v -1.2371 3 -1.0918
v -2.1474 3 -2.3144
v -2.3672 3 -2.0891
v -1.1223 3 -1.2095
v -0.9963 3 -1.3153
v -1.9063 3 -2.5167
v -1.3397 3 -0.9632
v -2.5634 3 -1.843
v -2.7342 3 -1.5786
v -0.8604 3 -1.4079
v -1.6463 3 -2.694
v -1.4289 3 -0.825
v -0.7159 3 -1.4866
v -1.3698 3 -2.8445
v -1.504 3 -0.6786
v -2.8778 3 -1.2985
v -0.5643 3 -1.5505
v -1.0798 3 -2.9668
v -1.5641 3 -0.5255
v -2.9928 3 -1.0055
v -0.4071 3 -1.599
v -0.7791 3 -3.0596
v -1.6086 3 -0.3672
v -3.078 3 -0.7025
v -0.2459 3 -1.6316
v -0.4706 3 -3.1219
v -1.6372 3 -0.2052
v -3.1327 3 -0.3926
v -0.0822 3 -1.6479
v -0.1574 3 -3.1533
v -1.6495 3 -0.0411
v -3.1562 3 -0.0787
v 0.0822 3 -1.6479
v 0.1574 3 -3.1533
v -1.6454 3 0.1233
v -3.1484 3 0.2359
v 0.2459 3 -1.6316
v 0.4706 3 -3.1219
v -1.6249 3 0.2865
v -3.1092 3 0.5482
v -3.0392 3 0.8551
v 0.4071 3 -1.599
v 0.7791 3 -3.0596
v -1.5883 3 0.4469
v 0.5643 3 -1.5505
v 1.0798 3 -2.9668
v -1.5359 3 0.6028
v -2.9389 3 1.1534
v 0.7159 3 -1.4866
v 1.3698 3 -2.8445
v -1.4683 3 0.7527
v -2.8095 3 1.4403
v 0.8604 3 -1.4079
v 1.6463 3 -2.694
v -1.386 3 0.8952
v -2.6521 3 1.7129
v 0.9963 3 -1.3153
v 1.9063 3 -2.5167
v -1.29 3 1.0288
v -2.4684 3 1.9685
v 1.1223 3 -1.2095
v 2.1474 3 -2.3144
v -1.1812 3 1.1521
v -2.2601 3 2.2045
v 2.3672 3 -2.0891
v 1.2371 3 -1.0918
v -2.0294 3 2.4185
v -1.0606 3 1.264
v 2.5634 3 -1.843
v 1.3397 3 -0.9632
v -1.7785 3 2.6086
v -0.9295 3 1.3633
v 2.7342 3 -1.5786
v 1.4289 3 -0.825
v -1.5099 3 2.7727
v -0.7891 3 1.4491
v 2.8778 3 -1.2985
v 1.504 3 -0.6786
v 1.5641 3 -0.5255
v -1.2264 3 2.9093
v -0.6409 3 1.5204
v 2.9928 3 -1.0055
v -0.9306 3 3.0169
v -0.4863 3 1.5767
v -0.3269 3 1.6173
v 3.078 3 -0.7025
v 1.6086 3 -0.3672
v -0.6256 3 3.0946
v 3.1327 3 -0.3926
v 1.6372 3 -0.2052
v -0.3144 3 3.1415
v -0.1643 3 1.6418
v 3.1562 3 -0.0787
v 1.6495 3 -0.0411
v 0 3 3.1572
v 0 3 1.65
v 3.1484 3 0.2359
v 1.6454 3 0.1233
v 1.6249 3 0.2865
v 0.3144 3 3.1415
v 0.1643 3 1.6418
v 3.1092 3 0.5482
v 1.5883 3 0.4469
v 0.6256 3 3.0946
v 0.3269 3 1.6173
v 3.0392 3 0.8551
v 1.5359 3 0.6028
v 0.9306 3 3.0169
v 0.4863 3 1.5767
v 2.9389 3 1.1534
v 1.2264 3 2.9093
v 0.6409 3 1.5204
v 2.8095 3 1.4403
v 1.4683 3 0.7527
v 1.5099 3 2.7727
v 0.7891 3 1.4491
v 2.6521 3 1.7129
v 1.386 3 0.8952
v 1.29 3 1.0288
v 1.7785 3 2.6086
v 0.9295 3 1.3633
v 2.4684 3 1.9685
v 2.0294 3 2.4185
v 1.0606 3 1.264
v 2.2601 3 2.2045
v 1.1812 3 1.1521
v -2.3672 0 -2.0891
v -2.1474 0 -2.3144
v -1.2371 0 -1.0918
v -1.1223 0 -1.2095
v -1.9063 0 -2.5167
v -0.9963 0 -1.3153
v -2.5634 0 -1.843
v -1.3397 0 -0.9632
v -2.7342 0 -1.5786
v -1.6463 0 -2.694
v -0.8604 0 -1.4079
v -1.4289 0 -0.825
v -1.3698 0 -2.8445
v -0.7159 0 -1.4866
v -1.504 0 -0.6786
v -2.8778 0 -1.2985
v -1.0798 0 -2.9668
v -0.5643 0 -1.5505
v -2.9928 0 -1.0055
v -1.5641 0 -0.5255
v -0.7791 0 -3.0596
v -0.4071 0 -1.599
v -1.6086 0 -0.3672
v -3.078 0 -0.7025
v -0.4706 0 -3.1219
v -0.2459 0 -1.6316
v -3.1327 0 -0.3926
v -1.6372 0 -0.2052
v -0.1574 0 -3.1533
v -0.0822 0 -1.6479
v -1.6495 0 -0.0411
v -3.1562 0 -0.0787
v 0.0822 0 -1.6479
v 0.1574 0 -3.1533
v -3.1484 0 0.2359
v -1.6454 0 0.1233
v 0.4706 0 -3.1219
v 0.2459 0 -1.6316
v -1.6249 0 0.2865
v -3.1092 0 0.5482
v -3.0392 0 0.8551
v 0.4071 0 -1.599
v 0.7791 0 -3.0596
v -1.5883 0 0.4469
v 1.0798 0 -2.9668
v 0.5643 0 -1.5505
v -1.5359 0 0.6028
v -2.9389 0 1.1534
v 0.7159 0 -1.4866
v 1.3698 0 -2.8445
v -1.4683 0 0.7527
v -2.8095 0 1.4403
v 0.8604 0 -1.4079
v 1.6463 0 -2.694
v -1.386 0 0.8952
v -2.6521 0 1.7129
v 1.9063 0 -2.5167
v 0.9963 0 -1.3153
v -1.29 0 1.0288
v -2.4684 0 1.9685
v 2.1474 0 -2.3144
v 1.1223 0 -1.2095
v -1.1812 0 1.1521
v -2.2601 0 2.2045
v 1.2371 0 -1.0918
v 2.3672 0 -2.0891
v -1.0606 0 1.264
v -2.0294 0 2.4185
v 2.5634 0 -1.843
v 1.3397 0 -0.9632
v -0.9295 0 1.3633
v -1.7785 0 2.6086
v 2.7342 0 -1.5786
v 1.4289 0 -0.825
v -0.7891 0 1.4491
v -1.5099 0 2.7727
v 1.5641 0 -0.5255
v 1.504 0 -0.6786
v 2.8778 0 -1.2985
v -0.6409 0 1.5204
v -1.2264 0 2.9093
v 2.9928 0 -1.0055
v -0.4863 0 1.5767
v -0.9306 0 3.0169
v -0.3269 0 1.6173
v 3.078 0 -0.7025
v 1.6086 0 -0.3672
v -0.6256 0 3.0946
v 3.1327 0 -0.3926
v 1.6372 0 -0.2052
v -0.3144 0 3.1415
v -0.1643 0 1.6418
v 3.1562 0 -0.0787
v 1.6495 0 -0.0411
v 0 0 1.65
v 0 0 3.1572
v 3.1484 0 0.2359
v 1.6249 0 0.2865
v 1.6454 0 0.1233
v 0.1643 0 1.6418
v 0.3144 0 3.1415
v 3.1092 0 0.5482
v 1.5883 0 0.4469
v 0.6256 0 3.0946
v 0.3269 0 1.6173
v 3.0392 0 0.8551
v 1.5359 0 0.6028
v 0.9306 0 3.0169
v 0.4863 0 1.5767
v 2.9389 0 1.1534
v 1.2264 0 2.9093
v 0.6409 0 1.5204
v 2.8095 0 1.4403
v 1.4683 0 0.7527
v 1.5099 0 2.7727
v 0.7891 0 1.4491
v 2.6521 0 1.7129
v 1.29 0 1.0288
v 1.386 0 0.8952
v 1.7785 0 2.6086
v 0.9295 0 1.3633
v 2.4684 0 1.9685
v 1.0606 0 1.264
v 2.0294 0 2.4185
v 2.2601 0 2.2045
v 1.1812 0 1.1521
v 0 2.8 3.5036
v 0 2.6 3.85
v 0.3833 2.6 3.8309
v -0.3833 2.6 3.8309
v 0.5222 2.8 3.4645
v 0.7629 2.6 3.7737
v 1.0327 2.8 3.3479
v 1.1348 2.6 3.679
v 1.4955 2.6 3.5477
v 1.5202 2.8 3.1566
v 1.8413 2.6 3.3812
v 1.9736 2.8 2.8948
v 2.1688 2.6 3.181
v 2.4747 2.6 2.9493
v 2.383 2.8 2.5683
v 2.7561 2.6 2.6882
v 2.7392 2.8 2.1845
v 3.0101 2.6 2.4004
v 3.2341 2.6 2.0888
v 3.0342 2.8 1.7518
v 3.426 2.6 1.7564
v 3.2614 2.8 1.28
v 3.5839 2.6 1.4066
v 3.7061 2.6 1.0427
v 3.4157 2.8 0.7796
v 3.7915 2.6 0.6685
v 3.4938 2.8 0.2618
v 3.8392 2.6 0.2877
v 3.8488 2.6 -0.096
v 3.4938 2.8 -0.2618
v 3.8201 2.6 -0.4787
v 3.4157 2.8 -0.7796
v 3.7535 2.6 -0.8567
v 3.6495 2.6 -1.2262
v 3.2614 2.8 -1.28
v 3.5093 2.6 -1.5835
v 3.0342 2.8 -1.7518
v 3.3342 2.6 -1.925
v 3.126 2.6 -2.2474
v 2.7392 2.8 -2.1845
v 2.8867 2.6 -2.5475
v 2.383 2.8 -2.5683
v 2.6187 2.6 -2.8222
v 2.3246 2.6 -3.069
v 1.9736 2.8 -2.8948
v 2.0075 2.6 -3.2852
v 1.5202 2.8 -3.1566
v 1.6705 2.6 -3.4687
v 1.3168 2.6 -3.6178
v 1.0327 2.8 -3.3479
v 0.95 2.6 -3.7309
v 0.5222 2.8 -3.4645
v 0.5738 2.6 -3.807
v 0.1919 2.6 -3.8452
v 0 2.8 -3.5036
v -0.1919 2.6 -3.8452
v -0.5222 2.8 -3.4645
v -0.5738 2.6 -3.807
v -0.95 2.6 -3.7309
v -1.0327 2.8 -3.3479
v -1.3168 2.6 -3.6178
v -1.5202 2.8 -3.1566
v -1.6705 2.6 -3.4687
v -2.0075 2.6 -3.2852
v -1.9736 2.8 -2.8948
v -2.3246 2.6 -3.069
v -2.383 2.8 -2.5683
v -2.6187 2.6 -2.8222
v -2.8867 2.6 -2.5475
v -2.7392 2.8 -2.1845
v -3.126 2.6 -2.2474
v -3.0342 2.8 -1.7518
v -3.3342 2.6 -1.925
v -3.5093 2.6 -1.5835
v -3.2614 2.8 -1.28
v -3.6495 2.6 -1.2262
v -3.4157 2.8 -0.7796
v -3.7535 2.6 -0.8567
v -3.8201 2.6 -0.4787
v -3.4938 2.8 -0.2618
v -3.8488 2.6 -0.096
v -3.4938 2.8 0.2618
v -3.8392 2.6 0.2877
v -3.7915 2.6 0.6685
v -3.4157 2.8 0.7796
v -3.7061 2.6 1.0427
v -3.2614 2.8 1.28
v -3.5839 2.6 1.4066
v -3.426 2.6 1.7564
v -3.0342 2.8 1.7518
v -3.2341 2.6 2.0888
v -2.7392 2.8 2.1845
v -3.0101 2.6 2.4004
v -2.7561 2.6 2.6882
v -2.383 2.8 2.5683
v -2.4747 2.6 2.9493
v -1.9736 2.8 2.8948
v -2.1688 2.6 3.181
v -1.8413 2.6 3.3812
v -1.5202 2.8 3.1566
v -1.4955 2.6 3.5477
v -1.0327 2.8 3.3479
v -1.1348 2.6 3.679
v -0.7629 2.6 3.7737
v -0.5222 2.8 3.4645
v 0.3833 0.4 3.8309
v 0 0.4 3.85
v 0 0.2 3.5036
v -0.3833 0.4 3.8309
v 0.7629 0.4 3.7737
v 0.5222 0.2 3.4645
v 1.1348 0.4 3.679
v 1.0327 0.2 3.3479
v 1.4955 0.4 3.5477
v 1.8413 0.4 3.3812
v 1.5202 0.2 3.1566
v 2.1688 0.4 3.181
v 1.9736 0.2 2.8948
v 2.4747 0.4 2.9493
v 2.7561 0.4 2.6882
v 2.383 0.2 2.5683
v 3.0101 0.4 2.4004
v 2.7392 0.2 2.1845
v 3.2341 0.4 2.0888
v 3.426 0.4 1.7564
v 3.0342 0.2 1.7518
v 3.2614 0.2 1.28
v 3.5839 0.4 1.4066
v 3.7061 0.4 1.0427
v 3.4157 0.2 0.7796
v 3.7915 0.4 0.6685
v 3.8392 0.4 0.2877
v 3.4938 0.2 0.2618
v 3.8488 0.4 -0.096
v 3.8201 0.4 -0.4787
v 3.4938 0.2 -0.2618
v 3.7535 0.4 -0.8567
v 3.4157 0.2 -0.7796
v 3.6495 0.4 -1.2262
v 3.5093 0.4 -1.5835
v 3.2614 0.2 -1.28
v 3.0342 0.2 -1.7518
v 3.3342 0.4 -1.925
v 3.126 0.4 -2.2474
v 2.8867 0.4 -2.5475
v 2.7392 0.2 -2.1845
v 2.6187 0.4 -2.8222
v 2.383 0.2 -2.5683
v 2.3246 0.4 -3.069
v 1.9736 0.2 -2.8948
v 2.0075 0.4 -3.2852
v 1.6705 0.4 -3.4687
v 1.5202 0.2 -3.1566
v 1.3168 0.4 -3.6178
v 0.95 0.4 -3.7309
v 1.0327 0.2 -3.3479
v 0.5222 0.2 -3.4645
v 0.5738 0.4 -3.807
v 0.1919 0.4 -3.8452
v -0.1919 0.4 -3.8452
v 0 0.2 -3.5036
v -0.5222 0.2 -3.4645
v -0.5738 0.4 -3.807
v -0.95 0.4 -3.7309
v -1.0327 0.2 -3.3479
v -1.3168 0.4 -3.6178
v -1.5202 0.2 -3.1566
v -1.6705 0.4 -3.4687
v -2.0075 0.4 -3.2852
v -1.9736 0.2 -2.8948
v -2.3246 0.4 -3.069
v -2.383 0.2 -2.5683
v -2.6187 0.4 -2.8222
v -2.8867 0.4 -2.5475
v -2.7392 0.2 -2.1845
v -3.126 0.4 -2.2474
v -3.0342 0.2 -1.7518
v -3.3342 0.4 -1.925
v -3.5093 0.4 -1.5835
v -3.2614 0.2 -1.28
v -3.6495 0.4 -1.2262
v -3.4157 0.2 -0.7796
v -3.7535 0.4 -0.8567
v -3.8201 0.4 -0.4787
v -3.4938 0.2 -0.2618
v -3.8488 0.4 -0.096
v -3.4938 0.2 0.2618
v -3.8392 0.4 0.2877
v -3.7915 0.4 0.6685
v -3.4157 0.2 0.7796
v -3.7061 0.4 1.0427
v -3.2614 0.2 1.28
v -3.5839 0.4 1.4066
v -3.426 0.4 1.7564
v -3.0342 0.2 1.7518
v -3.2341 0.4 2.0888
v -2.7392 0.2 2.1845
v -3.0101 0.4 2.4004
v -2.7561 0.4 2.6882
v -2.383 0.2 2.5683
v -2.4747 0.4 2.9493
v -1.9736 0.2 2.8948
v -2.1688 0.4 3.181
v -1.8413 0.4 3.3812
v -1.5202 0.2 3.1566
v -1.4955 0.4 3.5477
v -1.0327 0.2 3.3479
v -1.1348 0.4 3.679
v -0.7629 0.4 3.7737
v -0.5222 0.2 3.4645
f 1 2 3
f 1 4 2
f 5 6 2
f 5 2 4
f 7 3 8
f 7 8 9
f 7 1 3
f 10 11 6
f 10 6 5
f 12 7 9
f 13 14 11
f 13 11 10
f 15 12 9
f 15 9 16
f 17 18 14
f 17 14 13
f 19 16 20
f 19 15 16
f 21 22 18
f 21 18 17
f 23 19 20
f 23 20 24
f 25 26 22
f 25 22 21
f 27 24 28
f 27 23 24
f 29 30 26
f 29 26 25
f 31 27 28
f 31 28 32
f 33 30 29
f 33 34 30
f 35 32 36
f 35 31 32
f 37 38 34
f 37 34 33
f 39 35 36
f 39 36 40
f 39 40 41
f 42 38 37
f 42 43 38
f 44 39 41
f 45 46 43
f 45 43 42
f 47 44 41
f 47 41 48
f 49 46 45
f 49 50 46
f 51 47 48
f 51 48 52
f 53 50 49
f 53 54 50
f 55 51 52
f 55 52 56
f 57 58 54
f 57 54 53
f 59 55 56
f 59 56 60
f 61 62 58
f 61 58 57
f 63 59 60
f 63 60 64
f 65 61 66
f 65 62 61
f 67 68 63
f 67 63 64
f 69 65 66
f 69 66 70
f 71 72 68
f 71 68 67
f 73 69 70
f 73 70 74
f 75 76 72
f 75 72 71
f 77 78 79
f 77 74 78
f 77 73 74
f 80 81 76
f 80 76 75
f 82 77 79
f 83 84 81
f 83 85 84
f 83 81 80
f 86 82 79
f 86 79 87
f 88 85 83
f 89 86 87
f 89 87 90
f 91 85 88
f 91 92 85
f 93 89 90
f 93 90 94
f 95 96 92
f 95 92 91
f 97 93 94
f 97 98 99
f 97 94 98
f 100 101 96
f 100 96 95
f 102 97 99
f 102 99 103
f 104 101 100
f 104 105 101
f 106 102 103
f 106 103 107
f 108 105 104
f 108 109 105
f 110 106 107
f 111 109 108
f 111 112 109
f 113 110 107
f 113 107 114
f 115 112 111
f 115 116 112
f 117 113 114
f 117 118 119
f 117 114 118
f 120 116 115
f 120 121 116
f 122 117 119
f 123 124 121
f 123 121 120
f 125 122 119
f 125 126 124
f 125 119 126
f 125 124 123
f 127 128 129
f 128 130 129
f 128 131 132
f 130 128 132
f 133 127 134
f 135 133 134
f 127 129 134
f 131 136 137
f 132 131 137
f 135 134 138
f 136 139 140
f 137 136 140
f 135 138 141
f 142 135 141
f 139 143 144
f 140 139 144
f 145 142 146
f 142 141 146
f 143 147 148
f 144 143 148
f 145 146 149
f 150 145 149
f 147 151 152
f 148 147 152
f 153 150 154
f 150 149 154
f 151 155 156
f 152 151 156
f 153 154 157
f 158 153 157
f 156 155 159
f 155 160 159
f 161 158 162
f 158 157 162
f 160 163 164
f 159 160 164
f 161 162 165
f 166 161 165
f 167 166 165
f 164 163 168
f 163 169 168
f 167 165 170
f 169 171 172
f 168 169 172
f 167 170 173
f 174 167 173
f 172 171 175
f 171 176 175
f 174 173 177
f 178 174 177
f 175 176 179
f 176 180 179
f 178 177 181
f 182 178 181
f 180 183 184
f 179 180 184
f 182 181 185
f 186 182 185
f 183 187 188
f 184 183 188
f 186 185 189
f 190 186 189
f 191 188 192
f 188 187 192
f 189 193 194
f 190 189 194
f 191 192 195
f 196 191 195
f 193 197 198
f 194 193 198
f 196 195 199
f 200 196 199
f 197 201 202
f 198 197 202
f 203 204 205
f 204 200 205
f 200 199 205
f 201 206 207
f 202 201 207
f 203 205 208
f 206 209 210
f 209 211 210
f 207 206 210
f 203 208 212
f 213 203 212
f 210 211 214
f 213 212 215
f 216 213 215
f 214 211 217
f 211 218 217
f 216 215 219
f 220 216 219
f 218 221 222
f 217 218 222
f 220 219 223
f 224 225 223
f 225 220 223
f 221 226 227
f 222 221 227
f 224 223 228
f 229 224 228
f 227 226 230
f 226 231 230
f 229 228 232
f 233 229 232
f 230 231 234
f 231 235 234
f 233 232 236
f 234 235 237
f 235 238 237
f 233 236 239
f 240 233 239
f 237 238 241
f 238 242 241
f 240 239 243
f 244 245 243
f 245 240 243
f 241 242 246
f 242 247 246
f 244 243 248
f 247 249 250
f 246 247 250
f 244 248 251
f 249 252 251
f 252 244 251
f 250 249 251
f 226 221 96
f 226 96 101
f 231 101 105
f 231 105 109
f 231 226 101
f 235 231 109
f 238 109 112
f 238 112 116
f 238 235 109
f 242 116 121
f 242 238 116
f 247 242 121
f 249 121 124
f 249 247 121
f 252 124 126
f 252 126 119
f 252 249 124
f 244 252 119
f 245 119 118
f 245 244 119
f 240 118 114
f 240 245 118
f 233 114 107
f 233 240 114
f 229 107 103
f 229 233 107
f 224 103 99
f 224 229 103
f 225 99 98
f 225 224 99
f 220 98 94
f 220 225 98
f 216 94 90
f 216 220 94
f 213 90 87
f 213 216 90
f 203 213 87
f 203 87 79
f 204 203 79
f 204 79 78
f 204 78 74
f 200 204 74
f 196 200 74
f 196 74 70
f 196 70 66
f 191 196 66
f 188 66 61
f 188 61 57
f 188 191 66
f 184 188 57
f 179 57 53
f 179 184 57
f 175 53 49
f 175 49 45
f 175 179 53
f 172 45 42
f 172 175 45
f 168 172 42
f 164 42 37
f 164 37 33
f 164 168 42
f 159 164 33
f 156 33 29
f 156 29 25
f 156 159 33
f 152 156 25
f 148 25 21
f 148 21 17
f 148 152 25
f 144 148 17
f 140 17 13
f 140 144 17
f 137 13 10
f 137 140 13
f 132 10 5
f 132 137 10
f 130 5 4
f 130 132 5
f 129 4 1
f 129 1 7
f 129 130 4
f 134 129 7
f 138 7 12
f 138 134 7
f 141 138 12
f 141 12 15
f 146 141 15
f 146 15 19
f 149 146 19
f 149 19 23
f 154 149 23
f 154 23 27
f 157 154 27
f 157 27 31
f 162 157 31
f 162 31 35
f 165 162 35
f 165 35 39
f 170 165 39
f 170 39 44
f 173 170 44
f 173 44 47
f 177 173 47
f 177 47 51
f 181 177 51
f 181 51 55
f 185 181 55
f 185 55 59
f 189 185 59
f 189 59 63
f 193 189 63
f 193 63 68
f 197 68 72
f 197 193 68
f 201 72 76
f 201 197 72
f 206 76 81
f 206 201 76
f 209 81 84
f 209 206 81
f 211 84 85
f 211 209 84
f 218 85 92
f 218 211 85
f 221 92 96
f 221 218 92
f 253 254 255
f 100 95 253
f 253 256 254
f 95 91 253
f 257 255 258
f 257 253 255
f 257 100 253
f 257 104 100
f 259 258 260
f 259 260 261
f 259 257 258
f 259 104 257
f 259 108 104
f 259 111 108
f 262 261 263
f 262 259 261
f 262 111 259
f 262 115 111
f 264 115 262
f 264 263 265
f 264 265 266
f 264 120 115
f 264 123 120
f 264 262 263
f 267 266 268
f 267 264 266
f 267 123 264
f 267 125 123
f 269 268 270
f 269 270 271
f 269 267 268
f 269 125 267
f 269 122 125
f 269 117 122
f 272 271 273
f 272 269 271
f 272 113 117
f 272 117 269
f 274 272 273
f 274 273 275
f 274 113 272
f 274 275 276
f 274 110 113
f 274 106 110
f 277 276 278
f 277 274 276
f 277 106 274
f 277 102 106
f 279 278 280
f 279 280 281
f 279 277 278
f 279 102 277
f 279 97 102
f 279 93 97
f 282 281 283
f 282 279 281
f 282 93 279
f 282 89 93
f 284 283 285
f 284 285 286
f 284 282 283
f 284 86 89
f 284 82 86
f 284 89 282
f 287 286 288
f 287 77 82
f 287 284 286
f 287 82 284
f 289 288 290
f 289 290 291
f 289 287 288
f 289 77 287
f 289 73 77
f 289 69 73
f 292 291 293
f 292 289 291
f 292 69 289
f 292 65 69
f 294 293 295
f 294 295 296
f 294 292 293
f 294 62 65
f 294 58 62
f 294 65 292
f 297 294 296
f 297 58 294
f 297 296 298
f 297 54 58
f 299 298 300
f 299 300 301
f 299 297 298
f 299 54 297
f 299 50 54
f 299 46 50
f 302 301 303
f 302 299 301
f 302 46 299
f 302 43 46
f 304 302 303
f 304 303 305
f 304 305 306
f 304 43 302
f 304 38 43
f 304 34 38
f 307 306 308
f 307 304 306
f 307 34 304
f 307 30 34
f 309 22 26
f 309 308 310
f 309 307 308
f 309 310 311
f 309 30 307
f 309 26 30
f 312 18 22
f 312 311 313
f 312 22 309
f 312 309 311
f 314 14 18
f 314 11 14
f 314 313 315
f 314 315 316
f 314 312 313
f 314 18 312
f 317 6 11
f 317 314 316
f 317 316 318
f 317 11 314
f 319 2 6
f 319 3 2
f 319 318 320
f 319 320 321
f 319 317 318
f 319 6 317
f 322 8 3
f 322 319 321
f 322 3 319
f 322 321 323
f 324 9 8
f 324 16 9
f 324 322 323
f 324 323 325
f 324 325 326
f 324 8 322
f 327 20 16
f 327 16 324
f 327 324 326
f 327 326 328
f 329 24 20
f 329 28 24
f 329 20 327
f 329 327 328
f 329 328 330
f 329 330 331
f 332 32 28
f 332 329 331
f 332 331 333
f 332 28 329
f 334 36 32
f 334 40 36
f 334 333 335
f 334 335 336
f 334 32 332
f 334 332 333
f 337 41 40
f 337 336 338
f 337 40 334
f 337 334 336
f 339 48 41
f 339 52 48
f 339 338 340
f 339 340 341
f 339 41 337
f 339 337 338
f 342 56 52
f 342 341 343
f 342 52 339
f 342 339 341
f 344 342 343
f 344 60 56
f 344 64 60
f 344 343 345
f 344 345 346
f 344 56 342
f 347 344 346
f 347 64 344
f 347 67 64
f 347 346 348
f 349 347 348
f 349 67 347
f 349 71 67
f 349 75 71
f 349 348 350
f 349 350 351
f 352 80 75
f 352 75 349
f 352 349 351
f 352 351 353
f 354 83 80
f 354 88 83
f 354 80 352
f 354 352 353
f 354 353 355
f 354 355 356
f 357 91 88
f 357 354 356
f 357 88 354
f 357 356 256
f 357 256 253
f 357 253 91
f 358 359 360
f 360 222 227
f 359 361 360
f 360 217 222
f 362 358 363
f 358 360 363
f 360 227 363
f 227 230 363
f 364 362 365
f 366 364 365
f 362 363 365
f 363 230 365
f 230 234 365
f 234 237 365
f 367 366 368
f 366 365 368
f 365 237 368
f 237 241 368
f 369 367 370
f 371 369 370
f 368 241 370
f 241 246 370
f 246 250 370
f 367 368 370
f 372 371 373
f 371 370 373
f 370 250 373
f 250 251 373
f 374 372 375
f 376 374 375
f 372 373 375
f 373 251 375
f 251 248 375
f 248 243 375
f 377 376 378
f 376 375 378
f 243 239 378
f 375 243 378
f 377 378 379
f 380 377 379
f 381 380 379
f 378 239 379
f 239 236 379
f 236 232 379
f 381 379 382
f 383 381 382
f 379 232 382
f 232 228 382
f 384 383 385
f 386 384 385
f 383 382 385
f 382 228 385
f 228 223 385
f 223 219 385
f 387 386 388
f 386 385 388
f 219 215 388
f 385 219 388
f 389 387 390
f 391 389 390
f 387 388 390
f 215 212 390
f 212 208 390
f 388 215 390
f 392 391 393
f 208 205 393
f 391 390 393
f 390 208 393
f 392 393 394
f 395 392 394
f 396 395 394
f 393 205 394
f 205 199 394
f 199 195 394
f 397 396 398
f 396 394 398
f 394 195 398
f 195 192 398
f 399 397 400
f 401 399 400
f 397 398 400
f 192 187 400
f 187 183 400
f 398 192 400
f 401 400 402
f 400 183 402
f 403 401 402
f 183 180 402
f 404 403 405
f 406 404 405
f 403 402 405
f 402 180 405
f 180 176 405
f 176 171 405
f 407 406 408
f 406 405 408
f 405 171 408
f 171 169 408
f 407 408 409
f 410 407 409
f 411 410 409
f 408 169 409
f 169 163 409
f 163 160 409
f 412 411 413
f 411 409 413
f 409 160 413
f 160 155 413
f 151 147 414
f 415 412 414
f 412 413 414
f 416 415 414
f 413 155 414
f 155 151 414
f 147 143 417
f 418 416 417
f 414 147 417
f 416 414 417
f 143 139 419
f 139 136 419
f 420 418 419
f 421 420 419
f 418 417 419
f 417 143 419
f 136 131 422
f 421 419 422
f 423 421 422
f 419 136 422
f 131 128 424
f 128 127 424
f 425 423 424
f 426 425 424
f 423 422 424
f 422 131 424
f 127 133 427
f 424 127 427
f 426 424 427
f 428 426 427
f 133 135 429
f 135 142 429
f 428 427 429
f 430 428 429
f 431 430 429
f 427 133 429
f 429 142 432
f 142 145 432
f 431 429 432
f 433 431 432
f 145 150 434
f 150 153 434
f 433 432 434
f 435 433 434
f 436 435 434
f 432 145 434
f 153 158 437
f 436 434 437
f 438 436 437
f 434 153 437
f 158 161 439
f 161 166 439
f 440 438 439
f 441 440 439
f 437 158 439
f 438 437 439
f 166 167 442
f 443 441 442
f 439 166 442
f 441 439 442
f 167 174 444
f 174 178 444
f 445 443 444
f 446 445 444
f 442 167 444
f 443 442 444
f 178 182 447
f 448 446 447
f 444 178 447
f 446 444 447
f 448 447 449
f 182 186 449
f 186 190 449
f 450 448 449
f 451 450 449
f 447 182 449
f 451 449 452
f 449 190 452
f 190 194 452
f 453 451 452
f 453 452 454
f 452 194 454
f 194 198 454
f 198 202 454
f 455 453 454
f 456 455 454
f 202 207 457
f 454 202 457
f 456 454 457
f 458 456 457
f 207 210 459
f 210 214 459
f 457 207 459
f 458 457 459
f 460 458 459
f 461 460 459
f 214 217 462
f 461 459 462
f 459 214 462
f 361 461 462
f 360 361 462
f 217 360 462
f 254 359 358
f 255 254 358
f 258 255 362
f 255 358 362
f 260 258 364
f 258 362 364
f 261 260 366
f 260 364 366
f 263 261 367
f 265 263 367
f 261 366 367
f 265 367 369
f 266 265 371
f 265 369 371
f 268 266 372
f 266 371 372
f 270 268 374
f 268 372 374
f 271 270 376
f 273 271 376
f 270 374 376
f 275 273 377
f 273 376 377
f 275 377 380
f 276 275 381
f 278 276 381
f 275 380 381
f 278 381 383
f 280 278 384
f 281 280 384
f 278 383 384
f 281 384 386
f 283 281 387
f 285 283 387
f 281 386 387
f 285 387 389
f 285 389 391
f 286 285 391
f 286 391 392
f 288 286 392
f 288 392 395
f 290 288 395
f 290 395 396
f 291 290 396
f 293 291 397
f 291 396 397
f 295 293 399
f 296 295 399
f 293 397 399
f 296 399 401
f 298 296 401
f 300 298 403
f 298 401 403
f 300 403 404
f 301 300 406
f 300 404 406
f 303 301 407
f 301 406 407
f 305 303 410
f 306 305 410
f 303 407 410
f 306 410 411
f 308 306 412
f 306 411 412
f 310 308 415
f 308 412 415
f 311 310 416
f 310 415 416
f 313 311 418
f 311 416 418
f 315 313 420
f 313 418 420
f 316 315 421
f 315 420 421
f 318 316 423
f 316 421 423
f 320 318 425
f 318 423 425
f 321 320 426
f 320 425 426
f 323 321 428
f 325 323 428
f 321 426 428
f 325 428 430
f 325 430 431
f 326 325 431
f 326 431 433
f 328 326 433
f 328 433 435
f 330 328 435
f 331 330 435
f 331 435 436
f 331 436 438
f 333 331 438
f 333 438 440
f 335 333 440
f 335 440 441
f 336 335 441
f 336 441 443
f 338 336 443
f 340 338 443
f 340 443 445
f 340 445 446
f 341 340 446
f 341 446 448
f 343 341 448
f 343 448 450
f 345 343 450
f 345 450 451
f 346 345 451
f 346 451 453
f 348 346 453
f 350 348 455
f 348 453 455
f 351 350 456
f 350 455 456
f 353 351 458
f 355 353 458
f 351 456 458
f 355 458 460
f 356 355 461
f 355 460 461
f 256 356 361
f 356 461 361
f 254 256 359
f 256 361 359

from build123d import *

# Parameters (mm, degrees)
SKETCH_1_R       = 3.85
SKETCH_1_R_2     = 1.65
EXTRUDE_1_DEPTH  = 3
CHAMFER_8_SIZE   = 0.4
CHAMFER_8_SIZE2  = 0.692820323
CHAMFER_10_SIZE  = 0.4
CHAMFER_10_SIZE2 = 0.692820323


with BuildPart() as part:
    # Эскиз1 → Бобышка-Вытянуть1 (new body)
    with BuildSketch(Plane(origin=(0, 0, 0), x_dir=(1, 0, 0), z_dir=(0, 1, 0))):
        with Locations(Location((0, 0, 0), (0, 0, 270))):
            Circle(SKETCH_1_R)
        with Locations(Location((0, 0, 0), (0, 0, 270))):
            Circle(SKETCH_1_R_2, mode=Mode.SUBTRACT)
    extrude(amount=EXTRUDE_1_DEPTH)

    # Фаска8
    chamfer_8_edges = [part.edges().sort_by_distance(p)[0] for p in [
        (0, 3, -3.85),
    ]]
    chamfer_8_side = [part.faces().sort_by_distance(p)[0] for p in [
        (0, 1.5, -3.85),
    ]]
    chamfer(chamfer_8_edges, length=CHAMFER_8_SIZE, length2=CHAMFER_8_SIZE2, reference=chamfer_8_side[0])

    # Фаска10
    chamfer_10_edges = [part.edges().sort_by_distance(p)[0] for p in [
        (0, 0, -3.85),
    ]]
    chamfer_10_side = [part.faces().sort_by_distance(p)[0] for p in [
        (0, 1.3, -3.85),
    ]]
    chamfer(chamfer_10_edges, length=CHAMFER_10_SIZE, length2=CHAMFER_10_SIZE2, reference=chamfer_10_side[0])


solid = part.part
